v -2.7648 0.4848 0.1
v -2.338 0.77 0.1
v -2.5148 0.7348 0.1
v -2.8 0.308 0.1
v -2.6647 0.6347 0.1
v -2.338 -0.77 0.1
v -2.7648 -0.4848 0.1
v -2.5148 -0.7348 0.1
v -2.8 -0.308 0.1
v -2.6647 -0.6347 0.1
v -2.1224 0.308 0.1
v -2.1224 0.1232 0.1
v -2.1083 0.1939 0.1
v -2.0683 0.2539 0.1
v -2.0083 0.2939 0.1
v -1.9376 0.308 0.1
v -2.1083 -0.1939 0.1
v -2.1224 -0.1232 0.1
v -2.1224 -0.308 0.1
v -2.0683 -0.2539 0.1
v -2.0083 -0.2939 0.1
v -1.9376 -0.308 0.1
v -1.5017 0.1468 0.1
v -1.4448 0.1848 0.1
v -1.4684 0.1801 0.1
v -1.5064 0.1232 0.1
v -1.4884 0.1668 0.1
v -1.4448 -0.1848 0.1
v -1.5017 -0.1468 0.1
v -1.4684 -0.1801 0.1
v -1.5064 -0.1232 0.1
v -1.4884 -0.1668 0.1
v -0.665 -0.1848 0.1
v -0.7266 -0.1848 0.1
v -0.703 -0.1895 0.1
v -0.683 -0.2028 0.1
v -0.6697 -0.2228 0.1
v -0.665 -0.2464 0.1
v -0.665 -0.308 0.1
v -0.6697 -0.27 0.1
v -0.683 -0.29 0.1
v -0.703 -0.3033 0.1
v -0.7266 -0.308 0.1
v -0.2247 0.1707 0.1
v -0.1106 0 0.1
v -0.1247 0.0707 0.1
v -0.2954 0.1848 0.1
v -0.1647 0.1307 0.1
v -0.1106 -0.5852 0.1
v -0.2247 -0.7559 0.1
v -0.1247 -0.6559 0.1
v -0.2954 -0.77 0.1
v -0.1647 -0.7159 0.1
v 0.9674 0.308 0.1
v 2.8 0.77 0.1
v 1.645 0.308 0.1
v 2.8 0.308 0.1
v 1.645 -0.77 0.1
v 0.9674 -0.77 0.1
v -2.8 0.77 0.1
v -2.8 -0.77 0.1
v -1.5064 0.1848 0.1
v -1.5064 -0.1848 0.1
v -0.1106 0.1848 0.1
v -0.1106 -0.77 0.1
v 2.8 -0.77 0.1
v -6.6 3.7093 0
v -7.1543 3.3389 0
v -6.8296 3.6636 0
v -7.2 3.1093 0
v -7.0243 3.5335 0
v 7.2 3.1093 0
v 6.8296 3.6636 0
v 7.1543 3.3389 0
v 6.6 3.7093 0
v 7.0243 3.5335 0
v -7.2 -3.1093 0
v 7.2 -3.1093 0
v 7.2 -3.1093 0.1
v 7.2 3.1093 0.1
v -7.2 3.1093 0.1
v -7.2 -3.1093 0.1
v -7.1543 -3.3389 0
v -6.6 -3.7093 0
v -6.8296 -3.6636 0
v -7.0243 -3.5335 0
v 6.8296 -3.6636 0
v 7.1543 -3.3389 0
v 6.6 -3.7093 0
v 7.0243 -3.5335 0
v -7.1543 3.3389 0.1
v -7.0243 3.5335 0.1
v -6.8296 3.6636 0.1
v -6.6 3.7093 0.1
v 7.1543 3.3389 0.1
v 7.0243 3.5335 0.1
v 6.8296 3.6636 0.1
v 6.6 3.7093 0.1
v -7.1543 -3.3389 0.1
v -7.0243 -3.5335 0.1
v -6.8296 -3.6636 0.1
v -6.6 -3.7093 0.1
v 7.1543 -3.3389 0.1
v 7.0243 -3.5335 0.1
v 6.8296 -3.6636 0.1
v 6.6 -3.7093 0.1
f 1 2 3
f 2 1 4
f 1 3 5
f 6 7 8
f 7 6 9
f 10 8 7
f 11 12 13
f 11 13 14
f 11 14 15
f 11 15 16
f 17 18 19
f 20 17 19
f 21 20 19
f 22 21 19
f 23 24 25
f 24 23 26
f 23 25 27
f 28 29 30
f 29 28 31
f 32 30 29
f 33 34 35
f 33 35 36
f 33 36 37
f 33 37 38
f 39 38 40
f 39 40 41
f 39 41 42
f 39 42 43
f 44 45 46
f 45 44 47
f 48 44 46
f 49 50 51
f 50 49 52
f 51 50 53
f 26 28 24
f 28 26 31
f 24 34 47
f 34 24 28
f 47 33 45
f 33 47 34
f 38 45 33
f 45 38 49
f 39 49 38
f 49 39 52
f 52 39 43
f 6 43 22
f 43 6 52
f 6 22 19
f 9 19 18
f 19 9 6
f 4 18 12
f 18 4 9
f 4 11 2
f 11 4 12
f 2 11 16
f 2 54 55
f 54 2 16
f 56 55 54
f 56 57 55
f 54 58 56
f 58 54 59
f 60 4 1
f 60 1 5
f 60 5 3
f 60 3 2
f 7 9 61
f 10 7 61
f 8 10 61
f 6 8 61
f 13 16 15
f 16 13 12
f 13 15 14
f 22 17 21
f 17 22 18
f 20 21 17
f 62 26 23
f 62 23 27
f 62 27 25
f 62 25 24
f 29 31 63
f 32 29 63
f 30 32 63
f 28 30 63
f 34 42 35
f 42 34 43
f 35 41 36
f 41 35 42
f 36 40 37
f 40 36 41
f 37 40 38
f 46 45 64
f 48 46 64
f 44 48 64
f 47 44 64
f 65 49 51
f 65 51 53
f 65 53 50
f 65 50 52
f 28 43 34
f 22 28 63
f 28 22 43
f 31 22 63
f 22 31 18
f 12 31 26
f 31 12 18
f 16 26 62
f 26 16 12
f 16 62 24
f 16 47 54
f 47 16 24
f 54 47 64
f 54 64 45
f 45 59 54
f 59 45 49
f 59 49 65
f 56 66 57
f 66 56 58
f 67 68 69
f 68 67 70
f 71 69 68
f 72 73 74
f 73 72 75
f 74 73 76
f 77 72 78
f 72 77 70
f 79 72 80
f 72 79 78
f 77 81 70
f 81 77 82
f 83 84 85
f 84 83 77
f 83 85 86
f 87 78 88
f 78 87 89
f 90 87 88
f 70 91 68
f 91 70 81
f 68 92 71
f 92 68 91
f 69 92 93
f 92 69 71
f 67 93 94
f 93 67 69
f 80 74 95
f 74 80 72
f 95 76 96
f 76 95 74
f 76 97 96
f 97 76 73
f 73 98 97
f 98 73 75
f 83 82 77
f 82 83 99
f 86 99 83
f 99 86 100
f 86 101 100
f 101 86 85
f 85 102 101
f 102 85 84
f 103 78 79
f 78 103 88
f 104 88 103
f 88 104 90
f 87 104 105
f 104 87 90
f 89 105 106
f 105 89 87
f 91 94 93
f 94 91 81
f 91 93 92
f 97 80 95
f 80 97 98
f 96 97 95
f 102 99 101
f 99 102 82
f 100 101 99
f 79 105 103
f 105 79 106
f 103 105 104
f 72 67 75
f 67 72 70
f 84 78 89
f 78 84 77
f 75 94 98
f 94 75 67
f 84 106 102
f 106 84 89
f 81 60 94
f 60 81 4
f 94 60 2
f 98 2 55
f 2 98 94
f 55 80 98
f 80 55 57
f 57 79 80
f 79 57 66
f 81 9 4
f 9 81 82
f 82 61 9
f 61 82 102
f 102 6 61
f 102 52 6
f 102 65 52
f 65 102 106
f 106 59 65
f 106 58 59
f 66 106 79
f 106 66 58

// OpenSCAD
// file: ../p/2-4ndis.scad
use <../lib.scad>
function ldraw_lib__2_4ndis() = [
// 0 Disc Negative 0.5
// 0 Name: 2-4ndis.dat
// 0 Author: James Jessiman
// 0 !LDRAW_ORG Primitive UPDATE 2012-01
// 0 !LICENSE Licensed under CC BY 4.0 : see CAreadme.txt
// 
// 0 BFC CERTIFY CCW
  [0,"BFC","CERTIFY"],
  [0,"BFC","CCW"],
// 
// 0 !HISTORY 2002-03-23 [sbliss] Added BFC statement; compacted code
// 0 !HISTORY 2002-04-25 [PTadmin] Official Update 2002-02
// 0 !HISTORY 2007-06-24 [PTadmin] Header formatted for Contributor Agreement
// 0 !HISTORY 2008-07-01 [PTadmin] Official Update 2008-01
// 0 !HISTORY 2012-02-16 [Philo] Changed to CCW
// 0 !HISTORY 2012-03-30 [PTadmin] Official Update 2012-01
// 
// 
// 3 16 0.9239 0 0.3827 1 0 0 1 0 1
  [3,16,0.9239,0,0.3827,1,0,0,1,0,1],
// 3 16 0.7071 0 0.7071 0.9239 0 0.3827 1 0 1
  [3,16,0.7071,0,0.7071,0.9239,0,0.3827,1,0,1],
// 3 16 0.3827 0 0.9239 0.7071 0 0.7071 1 0 1
  [3,16,0.3827,0,0.9239,0.7071,0,0.7071,1,0,1],
// 3 16 0 0 1 0.3827 0 0.9239 1 0 1
  [3,16,0,0,1,0.3827,0,0.9239,1,0,1],
// 3 16 -0.3827 0 0.9239 0 0 1 -1 0 1
  [3,16,-0.3827,0,0.9239,0,0,1,-1,0,1],
// 3 16 -0.7071 0 0.7071 -0.3827 0 0.9239 -1 0 1
  [3,16,-0.7071,0,0.7071,-0.3827,0,0.9239,-1,0,1],
// 3 16 -0.9239 0 0.3827 -0.7071 0 0.7071 -1 0 1
  [3,16,-0.9239,0,0.3827,-0.7071,0,0.7071,-1,0,1],
// 3 16 -1 0 0 -0.9239 0 0.3827 -1 0 1
  [3,16,-1,0,0,-0.9239,0,0.3827,-1,0,1],
];
module ldraw_lib__2_4ndis(step=0, col=false, unit=2/5, alt=false, line=0.2, solid=!$preview)
    makepoly(ldraw_lib__2_4ndis(), step=step, col=col, unit=unit, alt=alt, line=line, solid=solid);
ldraw_lib__2_4ndis(line=0.2);
// file: ../p/2-4chrd.scad
use <../lib.scad>
function ldraw_lib__2_4chrd() = [
// 0 Chord 0.5
// 0 Name: 2-4chrd.dat
// 0 Author: Philippe Hurbain [Philo]
// 0 !LDRAW_ORG Primitive UPDATE 2014-01
// 0 !LICENSE Licensed under CC BY 4.0 : see CAreadme.txt
// 
// 0 BFC CERTIFY CCW
  [0,"BFC","CERTIFY"],
  [0,"BFC","CCW"],
// 
// 0 !HISTORY 2014-06-21 [PTadmin] Official Update 2014-01
// 
// 
// 4 16 0.9239 0 0.3827 -0.9239 0 0.3827 -1 0 0 1 0 0
  [4,16,0.9239,0,0.3827,-0.9239,0,0.3827,-1,0,0,1,0,0],
// 4 16 0.7071 0 0.7071 -0.7071 0 0.7071 -0.9239 0 0.3827 0.9239 0 0.3827
  [4,16,0.7071,0,0.7071,-0.7071,0,0.7071,-0.9239,0,0.3827,0.9239,0,0.3827],
// 4 16 0.3827 0 0.9239 -0.3827 0 0.9239 -0.7071 0 0.7071 0.7071 0 0.7071
  [4,16,0.3827,0,0.9239,-0.3827,0,0.9239,-0.7071,0,0.7071,0.7071,0,0.7071],
// 3 16 0 0 1 -0.3827 0 0.9239 0.3827 0 0.9239
  [3,16,0,0,1,-0.3827,0,0.9239,0.3827,0,0.9239],
];
module ldraw_lib__2_4chrd(step=0, col=false, unit=2/5, alt=false, line=0.2, solid=!$preview)
    makepoly(ldraw_lib__2_4chrd(), step=step, col=col, unit=unit, alt=alt, line=line, solid=solid);
ldraw_lib__2_4chrd(line=0.2);
// file: ../p/1-4ndis.scad
use <../lib.scad>
function ldraw_lib__1_4ndis() = [
// 0 Disc Negative 0.25
// 0 Name: 1-4ndis.dat
// 0 Author: James Jessiman
// 0 !LDRAW_ORG Primitive UPDATE 2012-01
// 0 !LICENSE Licensed under CC BY 4.0 : see CAreadme.txt
// 
// 0 BFC CERTIFY CCW
  [0,"BFC","CERTIFY"],
  [0,"BFC","CCW"],
// 
// 0 !HISTORY 2002-03-23 [sbliss] Added BFC Statement
// 0 !HISTORY 2002-04-25 [PTadmin] Official Update 2002-02
// 0 !HISTORY 2007-06-22 [PTadmin] Header formatted for Contributor Agreement
// 0 !HISTORY 2008-07-01 [PTadmin] Official Update 2008-01
// 0 !HISTORY 2012-02-16 [Philo] Changed to CCW
// 0 !HISTORY 2012-03-30 [PTadmin] Official Update 2012-01
// 
// 
// 3 16 0.9239 0 0.3827 1 0 0 1 0 1
  [3,16,0.9239,0,0.3827,1,0,0,1,0,1],
// 3 16 0.7071 0 0.7071 0.9239 0 0.3827 1 0 1
  [3,16,0.7071,0,0.7071,0.9239,0,0.3827,1,0,1],
// 3 16 0.3827 0 0.9239 0.7071 0 0.7071 1 0 1
  [3,16,0.3827,0,0.9239,0.7071,0,0.7071,1,0,1],
// 3 16 0 0 1 0.3827 0 0.9239 1 0 1
  [3,16,0,0,1,0.3827,0,0.9239,1,0,1],
];
module ldraw_lib__1_4ndis(step=0, col=false, unit=2/5, alt=false, line=0.2, solid=!$preview)
    makepoly(ldraw_lib__1_4ndis(), step=step, col=col, unit=unit, alt=alt, line=line, solid=solid);
ldraw_lib__1_4ndis(line=0.2);
// file: s/logofordt02.scad
use <../../lib.scad>
use <../../p/1-4chrd.scad>
use <../../p/1-4ndis.scad>
use <../../p/2-4ndis.scad>
function ldraw_lib__s__logofordt02() = [
// 0 ~Logo Ford Text "GT"
// 0 Name: s\logofordt02.dat
// 0 Author: Massimo Maso [Sirio]
// 0 !LDRAW_ORG Subpart UPDATE 2024-07
// 0 !LICENSE Licensed under CC BY 4.0 : see CAreadme.txt
// 
// 0 !HELP Exact dimensions X = 100; Z = 27.5
// 
// 0 BFC CERTIFY CCW
  [0,"BFC","CERTIFY"],
  [0,"BFC","CCW"],
// 
// 0 !HISTORY 2024-08-26 [OrionP] Official Update 2024-07
// 
// 
// 0 // Primitives
// 1 16 -41.75 0 5.5 -8.25 0 0 0 1 0 0 0 8.25 1-4chrd.dat
  [1,16,-41.75,0,5.5,-8.25,0,0,0,1,0,0,0,8.25, ldraw_lib__1_4chrd()],
// 1 16 -41.75 0 -5.5 -8.25 0 0 0 1 0 0 0 -8.25 1-4chrd.dat
  [1,16,-41.75,0,-5.5,-8.25,0,0,0,1,0,0,0,-8.25, ldraw_lib__1_4chrd()],
// 1 16 -34.6 0 2.2 -3.3 0 0 0 1 0 0 0 3.3 1-4ndis.dat
  [1,16,-34.6,0,2.2,-3.3,0,0,0,1,0,0,0,3.3, ldraw_lib__1_4ndis()],
// 1 16 -34.6 0 -2.2 -3.3 0 0 0 1 0 0 0 -3.3 1-4ndis.dat
  [1,16,-34.6,0,-2.2,-3.3,0,0,0,1,0,0,0,-3.3, ldraw_lib__1_4ndis()],
// 1 16 -25.8 0 2.2 -1.1 0 0 0 1 0 0 0 1.1 1-4chrd.dat
  [1,16,-25.8,0,2.2,-1.1,0,0,0,1,0,0,0,1.1, ldraw_lib__1_4chrd()],
// 1 16 -25.8 0 -2.2 -1.1 0 0 0 1 0 0 0 -1.1 1-4chrd.dat
  [1,16,-25.8,0,-2.2,-1.1,0,0,0,1,0,0,0,-1.1, ldraw_lib__1_4chrd()],
// 1 16 -12.975 0 -4.4 0 0 1.1 0 1 0 1.1 0 0 2-4ndis.dat
  [1,16,-12.975,0,-4.4,0,0,1.1,0,1,0,1.1,0,0, ldraw_lib__2_4ndis()],
// 1 16 -5.275 0 0 3.3 0 0 0 1 0 0 0 3.3 1-4chrd.dat
  [1,16,-5.275,0,0,3.3,0,0,0,1,0,0,0,3.3, ldraw_lib__1_4chrd()],
// 1 16 -5.275 0 -10.45 3.3 0 0 0 1 0 0 0 -3.3 1-4chrd.dat
  [1,16,-5.275,0,-10.45,3.3,0,0,0,1,0,0,0,-3.3, ldraw_lib__1_4chrd()],
// 0 // Faces
// 4 16 -25.8 0 3.3 -26.9 0 2.2 -26.9 0 -2.2 -25.8 0 -3.3
  [4,16,-25.8,0,3.3,-26.9,0,2.2,-26.9,0,-2.2,-25.8,0,-3.3],
// 4 16 -25.8 0 3.3 -25.8 0 -3.3 -12.975 0 -3.3 -5.275 0 3.3
  [4,16,-25.8,0,3.3,-25.8,0,-3.3,-12.975,0,-3.3,-5.275,0,3.3],
// 4 16 -11.875 0 -3.3 -1.975 0 0 -5.275 0 3.3 -12.975 0 -3.3
  [4,16,-11.875,0,-3.3,-1.975,0,0,-5.275,0,3.3,-12.975,0,-3.3],
// 4 16 -11.875 0 -3.3 -11.875 0 -4.4 -1.975 0 -10.45 -1.975 0 0
  [4,16,-11.875,0,-3.3,-11.875,0,-4.4,-1.975,0,-10.45,-1.975,0,0],
// 4 16 -5.275 0 -13.75 -1.975 0 -10.45 -11.875 0 -4.4 -11.875 0 -5.5
  [4,16,-5.275,0,-13.75,-1.975,0,-10.45,-11.875,0,-4.4,-11.875,0,-5.5],
// 3 16 -5.275 0 -13.75 -11.875 0 -5.5 -12.975 0 -5.5
  [3,16,-5.275,0,-13.75,-11.875,0,-5.5,-12.975,0,-5.5],
// 4 16 -5.275 0 -13.75 -12.975 0 -5.5 -34.6 0 -5.5 -41.75 0 -13.75
  [4,16,-5.275,0,-13.75,-12.975,0,-5.5,-34.6,0,-5.5,-41.75,0,-13.75],
// 3 16 -41.75 0 -13.75 -34.6 0 -5.5 -37.9 0 -5.5
  [3,16,-41.75,0,-13.75,-34.6,0,-5.5,-37.9,0,-5.5],
// 4 16 -41.75 0 -13.75 -37.9 0 -5.5 -37.9 0 -2.2 -50 0 -5.5
  [4,16,-41.75,0,-13.75,-37.9,0,-5.5,-37.9,0,-2.2,-50,0,-5.5],
// 4 16 -50 0 5.5 -50 0 -5.5 -37.9 0 -2.2 -37.9 0 2.2
  [4,16,-50,0,5.5,-50,0,-5.5,-37.9,0,-2.2,-37.9,0,2.2],
// 4 16 -41.75 0 13.75 -50 0 5.5 -37.9 0 2.2 -37.9 0 5.5
  [4,16,-41.75,0,13.75,-50,0,5.5,-37.9,0,2.2,-37.9,0,5.5],
// 3 16 -41.75 0 13.75 -37.9 0 5.5 -34.6 0 5.5
  [3,16,-41.75,0,13.75,-37.9,0,5.5,-34.6,0,5.5],
// 4 16 -41.75 0 13.75 -34.6 0 5.5 17.275 0 5.5 50 0 13.75
  [4,16,-41.75,0,13.75,-34.6,0,5.5,17.275,0,5.5,50,0,13.75],
// 3 16 29.375 0 5.5 50 0 13.75 17.275 0 5.5
  [3,16,29.375,0,5.5,50,0,13.75,17.275,0,5.5],
// 3 16 29.375 0 5.5 50 0 5.5 50 0 13.75
  [3,16,29.375,0,5.5,50,0,5.5,50,0,13.75],
// 4 16 29.375 0 5.5 17.275 0 5.5 17.275 0 -13.75 29.375 0 -13.75
  [4,16,29.375,0,5.5,17.275,0,5.5,17.275,0,-13.75,29.375,0,-13.75],
];
module ldraw_lib__s__logofordt02(step=0, col=false, unit=2/5, alt=false, line=0.2, solid=!$preview)
    makepoly(ldraw_lib__s__logofordt02(), step=step, col=col, unit=unit, alt=alt, line=line, solid=solid);
ldraw_lib__s__logofordt02(line=0.2);
// file: s/logofordb04.scad
use <../../lib.scad>
use <../../p/1-4chrd.scad>
use <../../p/1-4ndis.scad>
use <../../p/2-4chrd.scad>
function ldraw_lib__s__logofordb04() = [
// 0 ~Logo Ford Text "GT" Outer Box
// 0 Name: s\logofordb04.dat
// 0 Author: Massimo Maso [Sirio]
// 0 !LDRAW_ORG Subpart UPDATE 2024-07
// 0 !LICENSE Licensed under CC BY 4.0 : see CAreadme.txt
// 
// 0 !HELP Exact dimensions X = 100; Z = 27.5
// 
// 0 BFC CERTIFY CCW
  [0,"BFC","CERTIFY"],
  [0,"BFC","CCW"],
// 
// 0 !HISTORY 2024-08-26 [OrionP] Official Update 2024-07
// 
// 
// 0 // Primitives
// 1 16 -41.75 0 5.5 -8.25 0 0 0 1 0 0 0 8.25 1-4ndis.dat
  [1,16,-41.75,0,5.5,-8.25,0,0,0,1,0,0,0,8.25, ldraw_lib__1_4ndis()],
// 1 16 -41.75 0 -5.5 -8.25 0 0 0 1 0 0 0 -8.25 1-4ndis.dat
  [1,16,-41.75,0,-5.5,-8.25,0,0,0,1,0,0,0,-8.25, ldraw_lib__1_4ndis()],
// 1 16 -34.6 0 2.2 -3.3 0 0 0 1 0 0 0 3.3 1-4chrd.dat
  [1,16,-34.6,0,2.2,-3.3,0,0,0,1,0,0,0,3.3, ldraw_lib__1_4chrd()],
// 1 16 -34.6 0 -2.2 -3.3 0 0 0 1 0 0 0 -3.3 1-4chrd.dat
  [1,16,-34.6,0,-2.2,-3.3,0,0,0,1,0,0,0,-3.3, ldraw_lib__1_4chrd()],
// 1 16 -25.8 0 2.2 -1.1 0 0 0 1 0 0 0 1.1 1-4ndis.dat
  [1,16,-25.8,0,2.2,-1.1,0,0,0,1,0,0,0,1.1, ldraw_lib__1_4ndis()],
// 1 16 -25.8 0 -2.2 -1.1 0 0 0 1 0 0 0 -1.1 1-4ndis.dat
  [1,16,-25.8,0,-2.2,-1.1,0,0,0,1,0,0,0,-1.1, ldraw_lib__1_4ndis()],
// 1 16 -12.975 0 -4.4 0 0 1.1 0 1 0 1.1 0 0 2-4chrd.dat
  [1,16,-12.975,0,-4.4,0,0,1.1,0,1,0,1.1,0,0, ldraw_lib__2_4chrd()],
// 1 16 -5.275 0 0 3.3 0 0 0 1 0 0 0 3.3 1-4ndis.dat
  [1,16,-5.275,0,0,3.3,0,0,0,1,0,0,0,3.3, ldraw_lib__1_4ndis()],
// 1 16 -5.275 0 -10.45 3.3 0 0 0 1 0 0 0 -3.3 1-4ndis.dat
  [1,16,-5.275,0,-10.45,3.3,0,0,0,1,0,0,0,-3.3, ldraw_lib__1_4ndis()],
// 0 // Faces
// 3 16 -25.8 0 -3.3 -12.975 0 -5.5 -12.975 0 -3.3
  [3,16,-25.8,0,-3.3,-12.975,0,-5.5,-12.975,0,-3.3],
// 4 16 -25.8 0 -3.3 -26.9 0 -3.3 -34.6 0 -5.5 -12.975 0 -5.5
  [4,16,-25.8,0,-3.3,-26.9,0,-3.3,-34.6,0,-5.5,-12.975,0,-5.5],
// 4 16 -26.9 0 -2.2 -37.9 0 -2.2 -34.6 0 -5.5 -26.9 0 -3.3
  [4,16,-26.9,0,-2.2,-37.9,0,-2.2,-34.6,0,-5.5,-26.9,0,-3.3],
// 4 16 -26.9 0 -2.2 -26.9 0 2.2 -37.9 0 2.2 -37.9 0 -2.2
  [4,16,-26.9,0,-2.2,-26.9,0,2.2,-37.9,0,2.2,-37.9,0,-2.2],
// 4 16 -34.6 0 5.5 -37.9 0 2.2 -26.9 0 2.2 -26.9 0 3.3
  [4,16,-34.6,0,5.5,-37.9,0,2.2,-26.9,0,2.2,-26.9,0,3.3],
// 3 16 -34.6 0 5.5 -26.9 0 3.3 -25.8 0 3.3
  [3,16,-34.6,0,5.5,-26.9,0,3.3,-25.8,0,3.3],
// 4 16 -34.6 0 5.5 -25.8 0 3.3 -5.275 0 3.3 17.275 0 5.5
  [4,16,-34.6,0,5.5,-25.8,0,3.3,-5.275,0,3.3,17.275,0,5.5],
// 3 16 17.275 0 5.5 -5.275 0 3.3 -1.975 0 3.3
  [3,16,17.275,0,5.5,-5.275,0,3.3,-1.975,0,3.3],
// 3 16 17.275 0 5.5 -1.975 0 3.3 -1.975 0 0
  [3,16,17.275,0,5.5,-1.975,0,3.3,-1.975,0,0],
// 4 16 17.275 0 -13.75 17.275 0 5.5 -1.975 0 0 -1.975 0 -10.45
  [4,16,17.275,0,-13.75,17.275,0,5.5,-1.975,0,0,-1.975,0,-10.45],
// 3 16 17.275 0 -13.75 -1.975 0 -10.45 -1.975 0 -13.75
  [3,16,17.275,0,-13.75,-1.975,0,-10.45,-1.975,0,-13.75],
// 4 16 50 0 -13.75 50 0 5.5 29.375 0 5.5 29.375 0 -13.75
  [4,16,50,0,-13.75,50,0,5.5,29.375,0,5.5,29.375,0,-13.75],
];
module ldraw_lib__s__logofordb04(step=0, col=false, unit=2/5, alt=false, line=0.2, solid=!$preview)
    makepoly(ldraw_lib__s__logofordb04(), step=step, col=col, unit=unit, alt=alt, line=line, solid=solid);
ldraw_lib__s__logofordb04(line=0.2);
// file: ../p/box3u12.scad
use <../lib.scad>
function ldraw_lib__box3u12() = [
// 0 Box with 3 Parallel Faces without Any Edges
// 0 Name: box3u12.dat
// 0 Author: J.C. Tchang [tchang]
// 0 !LDRAW_ORG Primitive UPDATE 2014-02
// 0 !LICENSE Licensed under CC BY 4.0 : see CAreadme.txt
// 
// 0 BFC CERTIFY CCW
  [0,"BFC","CERTIFY"],
  [0,"BFC","CCW"],
// 
// 0 !HISTORY 2014-12-23 [PTadmin] Official Update 2014-02
// 
// 
// 4 16 -1 1 1 1 1 1 1 1 -1 -1 1 -1
  [4,16,-1,1,1,1,1,1,1,1,-1,-1,1,-1],
// 4 16 -1 1 1 -1 0 1 1 0 1 1 1 1
  [4,16,-1,1,1,-1,0,1,1,0,1,1,1,1],
// 4 16 1 1 -1 1 0 -1 -1 0 -1 -1 1 -1
  [4,16,1,1,-1,1,0,-1,-1,0,-1,-1,1,-1],
];
module ldraw_lib__box3u12(step=0, col=false, unit=2/5, alt=false, line=0.2, solid=!$preview)
    makepoly(ldraw_lib__box3u12(), step=step, col=col, unit=unit, alt=alt, line=line, solid=solid);
ldraw_lib__box3u12(line=0.2);
// file: ../p/1-4cyli.scad
use <../lib.scad>
function ldraw_lib__1_4cyli() = [
// 0 Cylinder 0.25
// 0 Name: 1-4cyli.dat
// 0 Author: James Jessiman
// 0 !LDRAW_ORG Primitive UPDATE 2012-01
// 0 !LICENSE Licensed under CC BY 4.0 : see CAreadme.txt
// 
// 0 BFC CERTIFY CCW
  [0,"BFC","CERTIFY"],
  [0,"BFC","CCW"],
// 
// 0 !HISTORY 2002-03-23 [sbliss] Added BFC statement.
// 0 !HISTORY 2002-04-25 [PTadmin] Official Update 2002-02
// 0 !HISTORY 2007-06-22 [PTadmin] Header formatted for Contributor Agreement
// 0 !HISTORY 2008-07-01 [PTadmin] Official Update 2008-01
// 0 !HISTORY 2012-02-16 [Philo] Changed to CCW
// 0 !HISTORY 2012-03-30 [PTadmin] Official Update 2012-01
// 
// 
// 4 16 1 1 0 0.9239 1 0.3827 0.9239 0 0.3827 1 0 0
  [4,16,1,1,0,0.9239,1,0.3827,0.9239,0,0.3827,1,0,0],
// 5 24 1 0 0 1 1 0 0.9239 0 0.3827 1 0 -1
  [5,24,1,0,0,1,1,0,0.9239,0,0.3827,1,0,-1],
// 4 16 0.9239 1 0.3827 0.7071 1 0.7071 0.7071 0 0.7071 0.9239 0 0.3827
  [4,16,0.9239,1,0.3827,0.7071,1,0.7071,0.7071,0,0.7071,0.9239,0,0.3827],
// 5 24 0.9239 0 0.3827 0.9239 1 0.3827 0.7071 0 0.7071 1 0 0
  [5,24,0.9239,0,0.3827,0.9239,1,0.3827,0.7071,0,0.7071,1,0,0],
// 4 16 0.7071 1 0.7071 0.3827 1 0.9239 0.3827 0 0.9239 0.7071 0 0.7071
  [4,16,0.7071,1,0.7071,0.3827,1,0.9239,0.3827,0,0.9239,0.7071,0,0.7071],
// 5 24 0.7071 0 0.7071 0.7071 1 0.7071 0.3827 0 0.9239 0.9239 0 0.3827
  [5,24,0.7071,0,0.7071,0.7071,1,0.7071,0.3827,0,0.9239,0.9239,0,0.3827],
// 4 16 0.3827 1 0.9239 0 1 1 0 0 1 0.3827 0 0.9239
  [4,16,0.3827,1,0.9239,0,1,1,0,0,1,0.3827,0,0.9239],
// 5 24 0.3827 0 0.9239 0.3827 1 0.9239 0 0 1 0.7071 0 0.7071
  [5,24,0.3827,0,0.9239,0.3827,1,0.9239,0,0,1,0.7071,0,0.7071],
// 5 24 0 0 1 0 1 1 0.3827 0 0.9239 -1 0 1
  [5,24,0,0,1,0,1,1,0.3827,0,0.9239,-1,0,1],
];
module ldraw_lib__1_4cyli(step=0, col=false, unit=2/5, alt=false, line=0.2, solid=!$preview)
    makepoly(ldraw_lib__1_4cyli(), step=step, col=col, unit=unit, alt=alt, line=line, solid=solid);
ldraw_lib__1_4cyli(line=0.2);
// file: ../p/1-4chrd.scad
use <../lib.scad>
function ldraw_lib__1_4chrd() = [
// 0 Chord 0.25
// 0 Name: 1-4chrd.dat
// 0 Author: Max Martin Richter [MMR1988]
// 0 !LDRAW_ORG Primitive UPDATE 2023-05
// 0 !LICENSE Licensed under CC BY 4.0 : see CAreadme.txt
// 
// 0 BFC CERTIFY CCW
  [0,"BFC","CERTIFY"],
  [0,"BFC","CCW"],
// 
// 0 !HISTORY 2004-04-22 [PTadmin] Official Update 2004-02
// 0 !HISTORY 2007-10-09 [PTadmin] Header formatted for Contributor Agreement
// 0 !HISTORY 2008-07-01 [PTadmin] Official Update 2008-01
// 0 !HISTORY 2012-08-02 [MMR1988] Re-creation with PrimGen2 and Rectifier
// 0 !HISTORY 2012-08-09 [PTadmin] Official Update 2012-02
// 0 !HISTORY 2023-10-27 [OrionP] Change author to MMR1988 from hafhead
// 0 !HISTORY 2023-10-31 [OrionP] Official Update 2023-05
// 
// 4 16 0.9239 0 0.3827 0.3827 0 0.9239 0 0 1 1 0 0
  [4,16,0.9239,0,0.3827,0.3827,0,0.9239,0,0,1,1,0,0],
// 3 16 0.7071 0 0.7071 0.3827 0 0.9239 0.9239 0 0.3827
  [3,16,0.7071,0,0.7071,0.3827,0,0.9239,0.9239,0,0.3827],
];
module ldraw_lib__1_4chrd(step=0, col=false, unit=2/5, alt=false, line=0.2, solid=!$preview)
    makepoly(ldraw_lib__1_4chrd(), step=step, col=col, unit=unit, alt=alt, line=line, solid=solid);
ldraw_lib__1_4chrd(line=0.2);
// main file
use <../lib.scad>
use <../p/1-4chrd.scad>
use <../p/1-4cyli.scad>
use <../p/box3u12.scad>
use <s/logofordb04.scad>
use <s/logofordt02.scad>
function ldraw_lib__6141955t() = [
// 0 Sticker  1 x  1.8 with Grey "GT" Text on Black Background
// 0 Name: 6141955t.dat
// 0 Author: Massimo Maso [Sirio]
// 0 !LDRAW_ORG Part UPDATE 2024-07
// 0 !LICENSE Licensed under CC BY 4.0 : see CAreadme.txt
// 
// 0 BFC CERTIFY CCW
  [0,"BFC","CERTIFY"],
  [0,"BFC","CCW"],
// 
// 0 !KEYWORDS Ford, Mustang, Set 75871, Speed Champions
// 
// 0 !HISTORY 2024-08-26 [OrionP] Official Update 2024-07
// 
// 
// 0 // Subparts
// 1 7 0 -.25 0 .14 0 0 0 1 0 0 0 .14 s\logofordt02.dat
  [1,7,0,-.25,0,.14,0,0,0,1,0,0,0,.14, ldraw_lib__s__logofordt02()],
// 1 0 0 -.25 0 .14 0 0 0 1 0 0 0 .14 s\logofordb04.dat
  [1,0,0,-.25,0,.14,0,0,0,1,0,0,0,.14, ldraw_lib__s__logofordb04()],
// 0 // Primitives
// 1 16 -16.5 0 7.7732 -1.5 0 0 0 -1 0 0 0 1.5 1-4chrd.dat
  [1,16,-16.5,0,7.7732,-1.5,0,0,0,-1,0,0,0,1.5, ldraw_lib__1_4chrd()],
// 1 16 16.5 0 7.7732 1.5 0 0 0 -1 0 0 0 1.5 1-4chrd.dat
  [1,16,16.5,0,7.7732,1.5,0,0,0,-1,0,0,0,1.5, ldraw_lib__1_4chrd()],
// 1 16 0 -.25 0 0 0 18 0 .25 0 7.7732 0 0 box3u12.dat
  [1,16,0,-.25,0,0,0,18,0,.25,0,7.7732,0,0, ldraw_lib__box3u12()],
// 1 16 -16.5 0 -7.7732 -1.5 0 0 0 -1 0 0 0 -1.5 1-4chrd.dat
  [1,16,-16.5,0,-7.7732,-1.5,0,0,0,-1,0,0,0,-1.5, ldraw_lib__1_4chrd()],
// 1 16 16.5 0 -7.7732 1.5 0 0 0 -1 0 0 0 -1.5 1-4chrd.dat
  [1,16,16.5,0,-7.7732,1.5,0,0,0,-1,0,0,0,-1.5, ldraw_lib__1_4chrd()],
// 1 16 -16.5 0 7.7732 -1.5 0 0 0 -.25 0 0 0 1.5 1-4cyli.dat
  [1,16,-16.5,0,7.7732,-1.5,0,0,0,-.25,0,0,0,1.5, ldraw_lib__1_4cyli()],
// 1 16 16.5 0 7.7732 1.5 0 0 0 -.25 0 0 0 1.5 1-4cyli.dat
  [1,16,16.5,0,7.7732,1.5,0,0,0,-.25,0,0,0,1.5, ldraw_lib__1_4cyli()],
// 1 16 -16.5 0 -7.7732 -1.5 0 0 0 -.25 0 0 0 -1.5 1-4cyli.dat
  [1,16,-16.5,0,-7.7732,-1.5,0,0,0,-.25,0,0,0,-1.5, ldraw_lib__1_4cyli()],
// 1 16 16.5 0 -7.7732 1.5 0 0 0 -.25 0 0 0 -1.5 1-4cyli.dat
  [1,16,16.5,0,-7.7732,1.5,0,0,0,-.25,0,0,0,-1.5, ldraw_lib__1_4cyli()],
// 1 0 -16.5 -.25 7.7732 -1.5 0 0 0 1 0 0 0 1.5 1-4chrd.dat
  [1,0,-16.5,-.25,7.7732,-1.5,0,0,0,1,0,0,0,1.5, ldraw_lib__1_4chrd()],
// 1 0 16.5 -.25 7.7732 1.5 0 0 0 1 0 0 0 1.5 1-4chrd.dat
  [1,0,16.5,-.25,7.7732,1.5,0,0,0,1,0,0,0,1.5, ldraw_lib__1_4chrd()],
// 1 0 -16.5 -.25 -7.7732 -1.5 0 0 0 1 0 0 0 -1.5 1-4chrd.dat
  [1,0,-16.5,-.25,-7.7732,-1.5,0,0,0,1,0,0,0,-1.5, ldraw_lib__1_4chrd()],
// 1 0 16.5 -.25 -7.7732 1.5 0 0 0 1 0 0 0 -1.5 1-4chrd.dat
  [1,0,16.5,-.25,-7.7732,1.5,0,0,0,1,0,0,0,-1.5, ldraw_lib__1_4chrd()],
// 0 // Bottom face
// 4 16 16.5 0 9.2732 18 0 7.7732 -18 0 7.7732 -16.5 0 9.2732
  [4,16,16.5,0,9.2732,18,0,7.7732,-18,0,7.7732,-16.5,0,9.2732],
// 4 16 18 0 -7.7732 16.5 0 -9.2732 -16.5 0 -9.2732 -18 0 -7.7732
  [4,16,18,0,-7.7732,16.5,0,-9.2732,-16.5,0,-9.2732,-18,0,-7.7732],
// 0 // Lateral face
// 4 16 -16.5 0 9.2732 -16.5 -.25 9.2732 16.5 -.25 9.2732 16.5 0 9.2732
  [4,16,-16.5,0,9.2732,-16.5,-.25,9.2732,16.5,-.25,9.2732,16.5,0,9.2732],
// 4 16 -16.5 0 -9.2732 16.5 0 -9.2732 16.5 -.25 -9.2732 -16.5 -.25 -9.2732
  [4,16,-16.5,0,-9.2732,16.5,0,-9.2732,16.5,-.25,-9.2732,-16.5,-.25,-9.2732],
// 0 // Top face
// 4 0 -16.5 -.25 9.2732 -18 -.25 7.7732 -7 -.25 .77 -7 -.25 1.925
  [4,0,-16.5,-.25,9.2732,-18,-.25,7.7732,-7,-.25,.77,-7,-.25,1.925],
// 3 0 -16.5 -.25 9.2732 -7 -.25 1.925 -5.845 -.25 1.925
  [3,0,-16.5,-.25,9.2732,-7,-.25,1.925,-5.845,-.25,1.925],
// 4 0 -16.5 -.25 9.2732 -5.845 -.25 1.925 7 -.25 1.925 16.5 -.25 9.2732
  [4,0,-16.5,-.25,9.2732,-5.845,-.25,1.925,7,-.25,1.925,16.5,-.25,9.2732],
// 4 0 18 -.25 7.7732 16.5 -.25 9.2732 7 -.25 1.925 7 -.25 .77
  [4,0,18,-.25,7.7732,16.5,-.25,9.2732,7,-.25,1.925,7,-.25,.77],
// 4 0 18 -.25 7.7732 7 -.25 .77 7 -.25 -1.925 18 -.25 -7.7732
  [4,0,18,-.25,7.7732,7,-.25,.77,7,-.25,-1.925,18,-.25,-7.7732],
// 4 0 -18 -.25 -7.7732 -7 -.25 -.77 -7 -.25 .77 -18 -.25 7.7732
  [4,0,-18,-.25,-7.7732,-7,-.25,-.77,-7,-.25,.77,-18,-.25,7.7732],
// 4 0 -18 -.25 -7.7732 -16.5 -.25 -9.2732 -7 -.25 -1.925 -7 -.25 -.77
  [4,0,-18,-.25,-7.7732,-16.5,-.25,-9.2732,-7,-.25,-1.925,-7,-.25,-.77],
// 3 0 -16.5 -.25 -9.2732 -5.845 -.25 -1.925 -7 -.25 -1.925
  [3,0,-16.5,-.25,-9.2732,-5.845,-.25,-1.925,-7,-.25,-1.925],
// 3 0 -16.5 -.25 -9.2732 -.7385 -.25 -1.925 -5.845 -.25 -1.925
  [3,0,-16.5,-.25,-9.2732,-.7385,-.25,-1.925,-5.845,-.25,-1.925],
// 4 0 -16.5 -.25 -9.2732 16.5 -.25 -9.2732 -.2765 -.25 -1.925 -.7385 -.25 -1.925
  [4,0,-16.5,-.25,-9.2732,16.5,-.25,-9.2732,-.2765,-.25,-1.925,-.7385,-.25,-1.925],
// 3 0 16.5 -.25 -9.2732 2.4185 -.25 -1.925 -.2765 -.25 -1.925
  [3,0,16.5,-.25,-9.2732,2.4185,-.25,-1.925,-.2765,-.25,-1.925],
// 3 0 16.5 -.25 -9.2732 4.1125 -.25 -1.925 2.4185 -.25 -1.925
  [3,0,16.5,-.25,-9.2732,4.1125,-.25,-1.925,2.4185,-.25,-1.925],
// 4 0 16.5 -.25 -9.2732 18 -.25 -7.7732 7 -.25 -1.925 4.1125 -.25 -1.925
  [4,0,16.5,-.25,-9.2732,18,-.25,-7.7732,7,-.25,-1.925,4.1125,-.25,-1.925],
];
module ldraw_lib__6141955t(step=0, col=false, unit=2/5, alt=false, line=0.2, solid=!$preview)
    makepoly(ldraw_lib__6141955t(), step=step, col=col, unit=unit, alt=alt, line=line, solid=solid);
ldraw_lib__6141955t(line=0.2);
